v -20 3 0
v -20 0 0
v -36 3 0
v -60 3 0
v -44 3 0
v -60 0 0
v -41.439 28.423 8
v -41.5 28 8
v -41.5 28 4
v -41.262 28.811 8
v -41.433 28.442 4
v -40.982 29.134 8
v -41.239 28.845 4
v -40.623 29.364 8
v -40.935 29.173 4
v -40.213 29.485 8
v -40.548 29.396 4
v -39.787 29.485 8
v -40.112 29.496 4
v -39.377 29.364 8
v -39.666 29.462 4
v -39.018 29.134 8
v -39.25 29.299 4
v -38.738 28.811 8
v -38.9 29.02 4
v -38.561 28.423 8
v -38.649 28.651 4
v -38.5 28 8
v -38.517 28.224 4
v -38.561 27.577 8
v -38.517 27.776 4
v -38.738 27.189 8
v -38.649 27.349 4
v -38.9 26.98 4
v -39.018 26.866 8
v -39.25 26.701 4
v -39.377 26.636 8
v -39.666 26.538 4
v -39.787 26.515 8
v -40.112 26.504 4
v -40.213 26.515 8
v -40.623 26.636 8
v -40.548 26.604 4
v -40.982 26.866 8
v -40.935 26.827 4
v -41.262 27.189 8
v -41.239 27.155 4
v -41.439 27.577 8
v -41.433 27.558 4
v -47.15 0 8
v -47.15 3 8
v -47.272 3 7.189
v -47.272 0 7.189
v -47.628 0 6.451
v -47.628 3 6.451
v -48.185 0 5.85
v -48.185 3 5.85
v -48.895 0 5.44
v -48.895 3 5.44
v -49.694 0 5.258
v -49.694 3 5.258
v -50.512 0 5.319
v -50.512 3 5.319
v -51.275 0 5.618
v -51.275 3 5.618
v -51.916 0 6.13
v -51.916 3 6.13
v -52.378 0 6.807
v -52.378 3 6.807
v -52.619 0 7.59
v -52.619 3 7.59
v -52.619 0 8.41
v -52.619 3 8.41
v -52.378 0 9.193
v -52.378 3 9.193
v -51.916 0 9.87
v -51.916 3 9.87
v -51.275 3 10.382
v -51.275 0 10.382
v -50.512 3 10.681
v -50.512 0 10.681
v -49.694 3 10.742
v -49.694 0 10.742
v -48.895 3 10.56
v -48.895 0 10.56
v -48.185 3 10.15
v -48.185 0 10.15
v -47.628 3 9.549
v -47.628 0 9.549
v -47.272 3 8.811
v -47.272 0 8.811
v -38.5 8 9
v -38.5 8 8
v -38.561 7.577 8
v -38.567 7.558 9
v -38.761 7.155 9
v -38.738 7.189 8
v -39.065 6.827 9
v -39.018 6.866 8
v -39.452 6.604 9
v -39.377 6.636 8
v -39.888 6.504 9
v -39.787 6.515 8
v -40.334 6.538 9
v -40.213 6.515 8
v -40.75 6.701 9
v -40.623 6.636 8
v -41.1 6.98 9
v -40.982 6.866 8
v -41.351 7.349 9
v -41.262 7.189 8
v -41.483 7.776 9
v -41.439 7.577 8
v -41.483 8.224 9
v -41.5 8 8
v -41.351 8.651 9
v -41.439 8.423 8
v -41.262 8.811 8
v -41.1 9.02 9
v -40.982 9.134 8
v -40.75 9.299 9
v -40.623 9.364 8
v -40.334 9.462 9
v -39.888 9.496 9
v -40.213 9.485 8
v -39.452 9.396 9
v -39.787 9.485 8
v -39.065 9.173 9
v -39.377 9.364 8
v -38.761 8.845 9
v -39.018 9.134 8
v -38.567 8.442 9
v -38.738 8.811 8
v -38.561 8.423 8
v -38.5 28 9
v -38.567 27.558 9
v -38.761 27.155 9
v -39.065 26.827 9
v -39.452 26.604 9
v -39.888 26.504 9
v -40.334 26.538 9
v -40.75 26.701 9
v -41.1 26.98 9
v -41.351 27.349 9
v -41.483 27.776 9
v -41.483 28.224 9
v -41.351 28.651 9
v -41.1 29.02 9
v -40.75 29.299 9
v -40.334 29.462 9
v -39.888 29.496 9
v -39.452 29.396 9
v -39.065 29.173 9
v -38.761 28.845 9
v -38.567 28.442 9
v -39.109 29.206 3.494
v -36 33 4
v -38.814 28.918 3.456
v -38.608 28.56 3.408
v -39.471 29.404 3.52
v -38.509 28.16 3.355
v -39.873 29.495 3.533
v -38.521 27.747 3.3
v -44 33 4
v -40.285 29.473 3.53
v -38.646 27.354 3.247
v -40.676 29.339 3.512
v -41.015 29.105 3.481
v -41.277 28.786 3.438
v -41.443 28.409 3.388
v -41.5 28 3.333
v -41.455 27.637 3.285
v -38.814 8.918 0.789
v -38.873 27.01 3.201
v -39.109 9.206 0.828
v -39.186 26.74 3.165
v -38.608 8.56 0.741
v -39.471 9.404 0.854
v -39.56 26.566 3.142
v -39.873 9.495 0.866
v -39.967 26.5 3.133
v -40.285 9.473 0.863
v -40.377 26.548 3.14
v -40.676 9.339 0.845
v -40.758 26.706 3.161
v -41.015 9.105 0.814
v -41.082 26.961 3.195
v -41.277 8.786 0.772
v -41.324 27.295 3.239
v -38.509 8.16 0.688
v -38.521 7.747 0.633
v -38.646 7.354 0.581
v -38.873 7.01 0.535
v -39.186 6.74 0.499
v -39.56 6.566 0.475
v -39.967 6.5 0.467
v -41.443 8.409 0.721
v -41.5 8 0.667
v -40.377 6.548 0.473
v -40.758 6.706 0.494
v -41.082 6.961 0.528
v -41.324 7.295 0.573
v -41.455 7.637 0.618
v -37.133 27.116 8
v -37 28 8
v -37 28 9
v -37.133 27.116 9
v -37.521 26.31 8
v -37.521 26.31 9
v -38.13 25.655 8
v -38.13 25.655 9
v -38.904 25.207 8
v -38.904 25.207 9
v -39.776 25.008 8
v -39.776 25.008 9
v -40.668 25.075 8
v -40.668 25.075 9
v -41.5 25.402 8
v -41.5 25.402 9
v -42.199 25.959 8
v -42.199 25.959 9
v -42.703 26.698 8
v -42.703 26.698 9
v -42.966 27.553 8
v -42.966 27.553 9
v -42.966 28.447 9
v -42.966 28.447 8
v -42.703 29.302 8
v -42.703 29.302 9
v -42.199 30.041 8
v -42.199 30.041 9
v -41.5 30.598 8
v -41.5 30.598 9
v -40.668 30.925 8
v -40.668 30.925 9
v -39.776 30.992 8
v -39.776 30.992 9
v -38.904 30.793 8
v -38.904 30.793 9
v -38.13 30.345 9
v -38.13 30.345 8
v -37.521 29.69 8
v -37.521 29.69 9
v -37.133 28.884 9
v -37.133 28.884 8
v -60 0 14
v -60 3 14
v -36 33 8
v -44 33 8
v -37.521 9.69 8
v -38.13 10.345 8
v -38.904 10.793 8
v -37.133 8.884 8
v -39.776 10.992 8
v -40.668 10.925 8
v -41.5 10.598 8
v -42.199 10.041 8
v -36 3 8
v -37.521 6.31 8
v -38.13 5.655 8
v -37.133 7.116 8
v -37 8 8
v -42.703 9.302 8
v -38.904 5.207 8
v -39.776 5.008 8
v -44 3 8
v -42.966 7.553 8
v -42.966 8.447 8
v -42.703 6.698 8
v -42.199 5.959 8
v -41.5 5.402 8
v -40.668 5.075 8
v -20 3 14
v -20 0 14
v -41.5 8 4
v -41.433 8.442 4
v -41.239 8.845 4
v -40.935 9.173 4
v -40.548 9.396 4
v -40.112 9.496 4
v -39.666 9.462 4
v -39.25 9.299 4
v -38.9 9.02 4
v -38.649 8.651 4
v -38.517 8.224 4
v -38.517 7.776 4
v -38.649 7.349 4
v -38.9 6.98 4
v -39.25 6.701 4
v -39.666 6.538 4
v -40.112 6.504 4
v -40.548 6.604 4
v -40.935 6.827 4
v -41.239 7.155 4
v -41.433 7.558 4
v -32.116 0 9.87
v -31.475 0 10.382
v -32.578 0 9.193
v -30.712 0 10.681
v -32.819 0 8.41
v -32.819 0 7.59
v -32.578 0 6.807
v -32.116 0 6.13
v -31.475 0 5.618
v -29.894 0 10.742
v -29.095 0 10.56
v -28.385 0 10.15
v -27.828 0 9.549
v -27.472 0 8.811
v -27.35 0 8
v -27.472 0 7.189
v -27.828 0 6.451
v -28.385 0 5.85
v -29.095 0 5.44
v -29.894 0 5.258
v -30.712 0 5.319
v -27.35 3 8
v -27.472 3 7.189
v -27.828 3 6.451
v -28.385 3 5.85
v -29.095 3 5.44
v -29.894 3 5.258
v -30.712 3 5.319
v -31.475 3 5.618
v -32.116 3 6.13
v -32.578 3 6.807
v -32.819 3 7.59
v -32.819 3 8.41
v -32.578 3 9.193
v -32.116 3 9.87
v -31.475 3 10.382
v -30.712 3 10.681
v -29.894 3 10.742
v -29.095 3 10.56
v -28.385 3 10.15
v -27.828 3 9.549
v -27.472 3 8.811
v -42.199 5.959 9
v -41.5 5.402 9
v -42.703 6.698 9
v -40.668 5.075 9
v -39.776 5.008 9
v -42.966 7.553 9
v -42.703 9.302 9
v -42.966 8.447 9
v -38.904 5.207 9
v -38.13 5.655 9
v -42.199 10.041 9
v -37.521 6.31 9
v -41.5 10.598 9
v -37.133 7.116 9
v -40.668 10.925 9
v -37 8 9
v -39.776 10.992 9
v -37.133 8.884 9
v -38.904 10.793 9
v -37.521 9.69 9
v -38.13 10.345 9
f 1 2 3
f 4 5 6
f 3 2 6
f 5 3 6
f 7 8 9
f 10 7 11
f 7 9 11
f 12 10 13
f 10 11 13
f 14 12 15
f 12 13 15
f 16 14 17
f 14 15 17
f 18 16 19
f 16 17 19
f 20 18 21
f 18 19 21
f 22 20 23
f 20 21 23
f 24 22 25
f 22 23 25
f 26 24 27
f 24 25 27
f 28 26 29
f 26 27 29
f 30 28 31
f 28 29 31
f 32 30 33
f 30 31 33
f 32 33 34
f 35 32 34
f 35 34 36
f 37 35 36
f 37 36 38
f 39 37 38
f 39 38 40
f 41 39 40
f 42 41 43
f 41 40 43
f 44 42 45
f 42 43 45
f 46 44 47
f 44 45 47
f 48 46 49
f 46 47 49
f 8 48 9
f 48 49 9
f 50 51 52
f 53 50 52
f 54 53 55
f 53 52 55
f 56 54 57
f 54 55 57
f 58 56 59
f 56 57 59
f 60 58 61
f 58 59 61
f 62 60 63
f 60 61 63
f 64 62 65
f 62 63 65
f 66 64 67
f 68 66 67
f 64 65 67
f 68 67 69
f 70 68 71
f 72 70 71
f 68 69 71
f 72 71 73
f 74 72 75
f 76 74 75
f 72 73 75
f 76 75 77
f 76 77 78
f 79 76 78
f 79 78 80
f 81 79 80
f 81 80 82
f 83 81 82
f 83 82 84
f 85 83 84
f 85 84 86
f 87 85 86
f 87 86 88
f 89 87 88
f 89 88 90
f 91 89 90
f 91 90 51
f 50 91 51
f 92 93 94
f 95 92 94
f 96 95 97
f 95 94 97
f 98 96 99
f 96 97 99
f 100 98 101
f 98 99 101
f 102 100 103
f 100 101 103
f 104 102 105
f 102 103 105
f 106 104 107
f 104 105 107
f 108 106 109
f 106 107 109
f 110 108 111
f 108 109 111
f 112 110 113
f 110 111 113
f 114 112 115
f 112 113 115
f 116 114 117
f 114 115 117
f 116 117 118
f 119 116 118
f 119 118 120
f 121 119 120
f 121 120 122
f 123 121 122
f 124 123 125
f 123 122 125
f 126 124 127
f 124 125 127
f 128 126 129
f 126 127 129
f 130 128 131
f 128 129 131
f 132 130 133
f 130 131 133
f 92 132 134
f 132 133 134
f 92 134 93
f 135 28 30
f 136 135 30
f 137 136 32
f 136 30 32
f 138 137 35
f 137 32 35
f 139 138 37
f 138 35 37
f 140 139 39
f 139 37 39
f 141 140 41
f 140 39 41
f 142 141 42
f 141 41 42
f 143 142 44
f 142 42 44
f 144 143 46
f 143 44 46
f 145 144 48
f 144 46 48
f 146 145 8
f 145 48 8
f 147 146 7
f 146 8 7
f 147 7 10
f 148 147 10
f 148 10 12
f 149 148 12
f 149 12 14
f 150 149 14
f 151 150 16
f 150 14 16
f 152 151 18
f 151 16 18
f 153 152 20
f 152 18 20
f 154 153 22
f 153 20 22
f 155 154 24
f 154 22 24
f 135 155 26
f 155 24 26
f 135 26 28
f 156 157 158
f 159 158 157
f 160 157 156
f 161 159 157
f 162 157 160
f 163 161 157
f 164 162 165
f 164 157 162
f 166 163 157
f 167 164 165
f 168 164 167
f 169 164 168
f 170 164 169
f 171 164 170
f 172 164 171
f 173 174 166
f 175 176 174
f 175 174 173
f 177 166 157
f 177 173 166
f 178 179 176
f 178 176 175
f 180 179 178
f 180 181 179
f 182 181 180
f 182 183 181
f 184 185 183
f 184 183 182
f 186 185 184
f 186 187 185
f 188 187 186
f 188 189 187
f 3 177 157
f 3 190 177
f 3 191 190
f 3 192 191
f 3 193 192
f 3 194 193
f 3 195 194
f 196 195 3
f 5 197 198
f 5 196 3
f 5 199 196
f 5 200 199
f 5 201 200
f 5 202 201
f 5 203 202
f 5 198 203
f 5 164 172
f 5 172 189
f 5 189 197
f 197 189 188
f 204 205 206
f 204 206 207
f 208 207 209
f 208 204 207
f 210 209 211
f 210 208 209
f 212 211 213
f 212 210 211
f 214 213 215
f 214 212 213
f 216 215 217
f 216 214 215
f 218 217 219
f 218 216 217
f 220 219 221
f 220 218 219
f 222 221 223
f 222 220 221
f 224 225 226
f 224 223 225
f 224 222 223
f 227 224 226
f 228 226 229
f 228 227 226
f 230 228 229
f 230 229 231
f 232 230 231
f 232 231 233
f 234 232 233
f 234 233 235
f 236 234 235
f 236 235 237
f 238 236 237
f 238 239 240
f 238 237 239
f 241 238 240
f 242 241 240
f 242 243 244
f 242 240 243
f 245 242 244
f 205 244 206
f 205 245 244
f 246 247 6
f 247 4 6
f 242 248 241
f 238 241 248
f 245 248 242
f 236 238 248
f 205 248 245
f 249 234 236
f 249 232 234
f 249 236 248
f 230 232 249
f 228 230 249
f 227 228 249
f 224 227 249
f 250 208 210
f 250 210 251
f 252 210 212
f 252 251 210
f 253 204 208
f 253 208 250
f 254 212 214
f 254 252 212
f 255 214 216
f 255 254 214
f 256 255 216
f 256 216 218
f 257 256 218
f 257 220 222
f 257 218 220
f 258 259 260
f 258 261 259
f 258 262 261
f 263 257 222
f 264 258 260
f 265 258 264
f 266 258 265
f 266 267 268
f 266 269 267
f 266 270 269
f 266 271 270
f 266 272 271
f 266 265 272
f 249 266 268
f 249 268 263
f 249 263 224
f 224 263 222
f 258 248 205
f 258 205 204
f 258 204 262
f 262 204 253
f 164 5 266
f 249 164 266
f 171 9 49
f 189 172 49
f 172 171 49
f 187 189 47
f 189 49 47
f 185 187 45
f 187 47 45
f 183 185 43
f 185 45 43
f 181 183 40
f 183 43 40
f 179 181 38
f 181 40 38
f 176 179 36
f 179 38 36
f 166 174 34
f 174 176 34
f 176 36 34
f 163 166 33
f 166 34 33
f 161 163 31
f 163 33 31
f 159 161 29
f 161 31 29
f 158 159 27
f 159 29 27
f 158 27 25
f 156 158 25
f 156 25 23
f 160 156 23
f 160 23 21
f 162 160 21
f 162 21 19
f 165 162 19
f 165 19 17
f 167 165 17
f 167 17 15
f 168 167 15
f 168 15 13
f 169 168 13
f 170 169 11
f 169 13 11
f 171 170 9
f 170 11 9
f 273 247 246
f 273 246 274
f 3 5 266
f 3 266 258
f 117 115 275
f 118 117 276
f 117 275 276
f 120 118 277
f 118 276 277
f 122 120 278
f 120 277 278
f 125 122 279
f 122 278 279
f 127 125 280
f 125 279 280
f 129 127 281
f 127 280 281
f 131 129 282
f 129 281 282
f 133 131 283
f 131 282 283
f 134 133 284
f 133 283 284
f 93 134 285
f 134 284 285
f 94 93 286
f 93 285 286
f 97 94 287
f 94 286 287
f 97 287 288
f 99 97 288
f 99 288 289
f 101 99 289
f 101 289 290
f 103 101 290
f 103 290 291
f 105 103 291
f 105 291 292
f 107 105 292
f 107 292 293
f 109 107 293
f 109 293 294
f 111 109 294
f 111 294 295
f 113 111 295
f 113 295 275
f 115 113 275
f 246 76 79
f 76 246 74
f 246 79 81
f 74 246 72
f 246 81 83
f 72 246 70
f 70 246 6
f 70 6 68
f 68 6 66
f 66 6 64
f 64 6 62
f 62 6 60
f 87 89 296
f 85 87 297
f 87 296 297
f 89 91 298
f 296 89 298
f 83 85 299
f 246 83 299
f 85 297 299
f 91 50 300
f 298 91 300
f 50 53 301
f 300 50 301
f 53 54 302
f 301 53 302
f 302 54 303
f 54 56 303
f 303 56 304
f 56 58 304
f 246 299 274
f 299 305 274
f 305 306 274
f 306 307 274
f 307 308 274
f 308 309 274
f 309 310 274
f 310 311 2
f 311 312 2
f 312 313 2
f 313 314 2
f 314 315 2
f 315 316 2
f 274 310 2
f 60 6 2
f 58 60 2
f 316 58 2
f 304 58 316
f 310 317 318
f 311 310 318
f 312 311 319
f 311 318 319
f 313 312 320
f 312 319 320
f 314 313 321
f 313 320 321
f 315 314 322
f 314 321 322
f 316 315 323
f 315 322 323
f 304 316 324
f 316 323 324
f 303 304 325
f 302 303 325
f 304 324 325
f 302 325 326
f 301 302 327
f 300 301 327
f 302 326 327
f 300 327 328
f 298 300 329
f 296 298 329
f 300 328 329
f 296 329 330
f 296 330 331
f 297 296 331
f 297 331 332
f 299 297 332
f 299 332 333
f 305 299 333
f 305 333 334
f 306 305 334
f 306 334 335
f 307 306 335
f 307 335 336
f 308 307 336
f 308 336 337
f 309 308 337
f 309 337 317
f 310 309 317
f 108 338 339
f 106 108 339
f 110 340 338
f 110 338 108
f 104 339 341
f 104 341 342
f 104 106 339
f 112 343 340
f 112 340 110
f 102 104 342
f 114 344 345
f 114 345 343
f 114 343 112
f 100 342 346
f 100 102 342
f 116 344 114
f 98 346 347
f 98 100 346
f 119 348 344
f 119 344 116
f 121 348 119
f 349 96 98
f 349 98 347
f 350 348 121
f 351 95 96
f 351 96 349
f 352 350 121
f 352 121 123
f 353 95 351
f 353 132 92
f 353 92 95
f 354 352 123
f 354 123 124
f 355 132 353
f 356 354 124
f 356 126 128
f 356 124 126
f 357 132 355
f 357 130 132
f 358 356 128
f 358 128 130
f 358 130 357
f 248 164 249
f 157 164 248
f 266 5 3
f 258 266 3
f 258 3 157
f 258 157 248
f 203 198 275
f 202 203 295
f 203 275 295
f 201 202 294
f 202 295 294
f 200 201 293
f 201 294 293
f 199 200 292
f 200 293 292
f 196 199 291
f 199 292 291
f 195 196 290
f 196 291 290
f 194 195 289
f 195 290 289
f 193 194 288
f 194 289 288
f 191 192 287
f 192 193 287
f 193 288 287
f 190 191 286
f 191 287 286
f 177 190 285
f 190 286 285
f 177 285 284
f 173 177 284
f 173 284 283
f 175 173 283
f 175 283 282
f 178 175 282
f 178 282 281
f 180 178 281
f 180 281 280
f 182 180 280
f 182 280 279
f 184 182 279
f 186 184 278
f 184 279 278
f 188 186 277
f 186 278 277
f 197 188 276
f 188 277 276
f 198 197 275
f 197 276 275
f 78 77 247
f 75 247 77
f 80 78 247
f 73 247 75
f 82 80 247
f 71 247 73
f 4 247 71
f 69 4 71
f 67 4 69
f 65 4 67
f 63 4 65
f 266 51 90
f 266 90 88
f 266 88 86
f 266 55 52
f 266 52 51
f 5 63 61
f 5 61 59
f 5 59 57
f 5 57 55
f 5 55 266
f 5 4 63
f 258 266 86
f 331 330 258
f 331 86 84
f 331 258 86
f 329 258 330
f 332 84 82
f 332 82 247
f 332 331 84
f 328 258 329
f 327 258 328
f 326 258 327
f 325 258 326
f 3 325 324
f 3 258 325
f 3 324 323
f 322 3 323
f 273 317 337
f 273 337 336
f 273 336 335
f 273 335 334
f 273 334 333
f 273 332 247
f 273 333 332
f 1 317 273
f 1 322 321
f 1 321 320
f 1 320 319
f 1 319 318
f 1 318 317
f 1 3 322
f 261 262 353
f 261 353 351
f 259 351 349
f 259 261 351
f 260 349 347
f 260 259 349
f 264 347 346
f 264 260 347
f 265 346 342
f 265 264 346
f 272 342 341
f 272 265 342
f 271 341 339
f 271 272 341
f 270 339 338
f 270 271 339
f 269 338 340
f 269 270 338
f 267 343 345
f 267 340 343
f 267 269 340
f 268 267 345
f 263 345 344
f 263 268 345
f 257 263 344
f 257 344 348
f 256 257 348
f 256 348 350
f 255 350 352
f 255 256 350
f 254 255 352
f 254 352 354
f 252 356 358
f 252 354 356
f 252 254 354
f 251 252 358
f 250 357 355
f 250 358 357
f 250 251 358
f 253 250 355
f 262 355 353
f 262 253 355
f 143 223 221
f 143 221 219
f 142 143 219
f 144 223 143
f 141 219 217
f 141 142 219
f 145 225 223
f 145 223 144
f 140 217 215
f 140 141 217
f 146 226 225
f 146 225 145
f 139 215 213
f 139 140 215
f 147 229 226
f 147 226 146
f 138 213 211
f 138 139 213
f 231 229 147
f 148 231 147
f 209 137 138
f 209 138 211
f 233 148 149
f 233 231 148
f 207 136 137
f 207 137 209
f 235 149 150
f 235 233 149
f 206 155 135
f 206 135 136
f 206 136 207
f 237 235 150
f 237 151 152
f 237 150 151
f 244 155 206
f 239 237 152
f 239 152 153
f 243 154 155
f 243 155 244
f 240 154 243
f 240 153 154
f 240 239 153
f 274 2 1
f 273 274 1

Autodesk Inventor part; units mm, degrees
ref_plane "YZ Plane" through (0, 0, 0) normal (1, 0, 0) x (0, 1, 0)
ref_plane "XZ Plane" through (0, 0, 0) normal (0, 1, 0) x (-1, 0, 0)
ref_plane "XY Plane" through (0, 0, 0) normal (0, 0, 1) x (1, 0, 0)
sketch "Sketch1" plane through (0, 0, 0) normal (0, 1, 0) x (-1, 0, 0)
  circle A0 centre (30.1, 6) radius 2.1
  circle A1 centre (49.9, 6) radius 2.1
  line L0 (0, 0) -> (80, 0)
  line L1 (80, 0) -> (80, 12)
  line L2 (0, 12) -> (80, 12)
  line L3 (0, 0) -> (0, 12)
  line L4 (40, 12) -> (15, 12)
  line L5 (15, 12) -> (15, 0)
  line L6 (15, 0) -> (65, 0)
  line L7 (65, 0) -> (65, 12)
  circle A2 centre (49.9, 6) radius 2.75
  circle A3 centre (30.1, 6) radius 2.75
  dimension "d0" = 25
  dimension "d1" = 50
  dimension "d2" = 5.5
  dimension "d3" = 5.5
extrude "Extrusion1" add sketch "Sketch1" along normal blind 3 contours L5 L2 L7 L0
sketch "Sketch6" plane through (0, 3, 0) normal (0, 1, 0) x (1, 0, 0)
  line L0 (-15, 0) -> (-65, 0) projected
  line L1 (-40, 0) -> (-43, 0)
  line L2 (-65, -12) -> (-15, -12) projected
  line L3 (-40, -12) -> (-40, -8)
  line L4 (-40, -8) -> (-43, -8)
  line L5 (-43, -8) -> (-43, -4)
  line L6 (-43, -4) -> (-37, -4)
  line L7 (-37, -4) -> (-37, -8)
  line L8 (-37, -8) -> (-40, -8)
  line L9 (-43, -8) -> (-44, -8)
  line L10 (-44, -8) -> (-44, -4)
  line L11 (-44, -4) -> (-43, -4)
  line L12 (-43, -4) -> (-43, -8)
  line L13 (-37, -4) -> (-36, -4)
  line L14 (-36, -4) -> (-36, -8)
  line L15 (-36, -8) -> (-37, -8)
  line L16 (-37, -8) -> (-37, -4)
  point P0 (0, 0)
  dimension "d22" = 3
  dimension "d23" = 4
  dimension "d24" = 4
  dimension "d25" = 6
  dimension "d28" = 1
  dimension "d29" = 1
extrude "Extrusion6" add sketch "Sketch6" along normal blind 30
sketch "Sketch8" plane through (-65, 0, 0) normal (-1, 0, 0) x (0, 0, 1)
  line L0 (0, 0) -> (12, 0) projected
  line L1 (12, 0) -> (12, 3) projected
  line L2 (0, 3) -> (12, 3) projected
  line L3 (0, 0) -> (0, 3) projected
extrude "Extrusion8" cut sketch "Sketch8" against normal blind 5
sketch "Sketch9" plane through (-15, 0, 12) normal (1, 0, 0) x (0, 0, -1)
  line L0 (0, 0) -> (12, 0) projected
  line L1 (12, 0) -> (12, 3) projected
  line L2 (0, 3) -> (12, 3) projected
  line L3 (0, 0) -> (0, 3) projected
extrude "Extrusion9" cut sketch "Sketch9" against normal blind 5
sketch "Sketch10" plane through (-44, 3, 4) normal (-1, 0, 0) x (0, 0, 1)
  line L0 (-4, -3) -> (-4, 0) projected
  line L1 (-4, 0) -> (0, 0)
  line L2 (-0.75, 0) -> (4.75, 0) projected
  line L3 (0, 30) -> (-4, 0)
  line L4 (0, 30) -> (4, 30) projected
  line L5 (4, 0) -> (4, 30) projected
  dimension "d41" = 4
extrude "Extrusion10" add sketch "Sketch10" against normal blind 8
sketch "Sketch7" plane through (-36, 3, 4) normal (0, 0, -1) x (-1, 0, 0)
  line L0 (8, 0) -> (8, 30) projected
  line L1 (8, 15) -> (8, 5)
  line L2 (8, 5) -> (8, 25)
  line L3 (8, 25) -> (4, 25)
  line L4 (0, 0) -> (0, 30) projected
  line L5 (8, 5) -> (4, 5)
  circle A0 centre (4, 25) radius 1.5
  circle A1 centre (4, 5) radius 1.5
  point P0 (-36, -3)
  dimension "d30" = 10
  dimension "d31" = 20
  dimension "d32" = 4
  dimension "d33" = 3
  dimension "d34" = 3
extrude "Extrusion7" cut sketch "Sketch7" along normal mid plane 30
sketch "Sketch11" plane through (-44, 3, 8) normal (0, 0, 1) x (1, 0, 0)
  circle A0 centre (4, 25) radius 1.5 projected
  circle A1 centre (4, 5) radius 1.5 projected
  circle A2 centre (4, 25) radius 3
  circle A3 centre (4, 5) radius 3
  point P0 (44, -3)
  dimension "d44" = 6
  dimension "d45" = 6
extrude "Extrusion11" add sketch "Sketch11" along normal blind 1
sketch "Sketch12" plane through (-60, 0, 12) normal (0, 0, 1) x (1, 0, 0)
  line L0 (40, 0) -> (40, 3) projected
  line L1 (0, 3) -> (40, 3) projected
  line L2 (0, 3) -> (0, 0) projected
  line L3 (0, 0) -> (40, 0) projected
  point P0 (60, 0)
extrude "Extrusion12" add sketch "Sketch12" along normal blind 2
sketch "Sketch13" plane through (0, 3, 0) normal (0, 1, 0) x (1, 0, 0)
  circle A0 centre (-30.1, -6) radius 2.75 projected
  circle A1 centre (-49.9, -6) radius 2.75 projected
  line L0 (-36, 0) -> (-36, -8) projected
  line L1 (-36, -8) -> (-44, -8) projected
  line L2 (-44, -8) -> (-44, 0) projected
  line L3 (-44, 0) -> (-60, 0) projected
  line L4 (-60, 0) -> (-60, -14) projected
  line L5 (-20, -14) -> (-60, -14) projected
  line L6 (-20, -14) -> (-20, 0) projected
  line L7 (-20, 0) -> (-36, 0) projected
  line L8 (-30.1, -6) -> (-30.1, -8)
  line L9 (-49.9, -6) -> (-49.9, -8)
  circle A2 centre (-49.9, -8) radius 2.75
  circle A3 centre (-30.1, -8) radius 2.75
  point P0 (0, 0)
sketch "Sketch14" plane through (0, 3, 0) normal (0, 1, 0) x (1, 0, 0)
  circle A0 centre (-49.9, -6) radius 2.75 projected
  circle A1 centre (-30.1, -6) radius 2.75 projected
  point P0 (0, 0)
extrude "Extrusion14" add sketch "Sketch13" against normal up to surface (3 mm away) contours A0 A3 | A3 A0 | A1 A2 | A2 A1 picked at (-29.7315, -4.622) picked at (-30.3176, -7.5571) picked at (-49.5315, -4.622) picked at (-50.1176, -6.4429)
sketch "Sketch15" plane through (0, 3, 0) normal (0, 1, 0) x (1, 0, 0)
  circle A0 centre (-30.1, -6) radius 2.75 projected
  circle A1 centre (-49.9, -6) radius 2.75 projected
  line L0 (-30.1, -6) -> (-30.1, -8)
  line L1 (-49.9, -6) -> (-49.9, -8)
  circle A2 centre (-49.9, -8) radius 2.75
  circle A3 centre (-30.1, -8) radius 2.75
  point P0 (0, 0)
  dimension "d54" = 2
extrude "Extrusion15" cut sketch "Sketch15" against normal through all contours A3 A0 | A0 A3 | A2 A1 | A1 A2 picked at (-30.3176, -7.5571) picked at (-29.7315, -9.378) picked at (-50.1176, -6.4429) picked at (-49.5315, -9.378)
sketch "Sketch16" plane through (-60, 0, 14) normal (0, 0, 1) x (1, 0, 0)
  line L0 (40, 3) -> (0, 3) projected
  line L1 (0, 0) -> (0, 3) projected
  line L2 (0, 3) -> (20, 59.8122)
  line L3 (40, 3) -> (24, 3) projected
  line L4 (20, 59.8122) -> (40, 3)
  line L5 (0, 3) -> (40, 3)
  line L6 (24, 3) -> (16, 3) projected
  point P0 (60, 0)
split body "Split1" sketch "Sketch16" result two bodies curves L2 L4 L5 first body at (-43.1895, 0.5, 1.7567)
sketch "Sketch17" plane through (-44, 33, 8) normal (0, 0, 1) x (1, 0, 0)
  circle A0 centre (4, -25) radius 3 projected
  circle A1 centre (4, -5) radius 3 projected
  line L0 (8, -30) -> (0, -30) projected
  line L1 (8, -30) -> (8, 0) projected
  line L2 (0, 0) -> (8, 0) projected
  line L3 (0, -30) -> (0, 0) projected
  circle A2 centre (4, -25) radius 3 projected
  circle A3 centre (4, -25) radius 1.5 projected
  circle A4 centre (4, -5) radius 1.5 projected
  circle A5 centre (4, -5) radius 3 projected
  circle A6 centre (4, -5) radius 1.5 projected
  point P0 (44, -33)
properties part number "limit_switch_horizontal"
